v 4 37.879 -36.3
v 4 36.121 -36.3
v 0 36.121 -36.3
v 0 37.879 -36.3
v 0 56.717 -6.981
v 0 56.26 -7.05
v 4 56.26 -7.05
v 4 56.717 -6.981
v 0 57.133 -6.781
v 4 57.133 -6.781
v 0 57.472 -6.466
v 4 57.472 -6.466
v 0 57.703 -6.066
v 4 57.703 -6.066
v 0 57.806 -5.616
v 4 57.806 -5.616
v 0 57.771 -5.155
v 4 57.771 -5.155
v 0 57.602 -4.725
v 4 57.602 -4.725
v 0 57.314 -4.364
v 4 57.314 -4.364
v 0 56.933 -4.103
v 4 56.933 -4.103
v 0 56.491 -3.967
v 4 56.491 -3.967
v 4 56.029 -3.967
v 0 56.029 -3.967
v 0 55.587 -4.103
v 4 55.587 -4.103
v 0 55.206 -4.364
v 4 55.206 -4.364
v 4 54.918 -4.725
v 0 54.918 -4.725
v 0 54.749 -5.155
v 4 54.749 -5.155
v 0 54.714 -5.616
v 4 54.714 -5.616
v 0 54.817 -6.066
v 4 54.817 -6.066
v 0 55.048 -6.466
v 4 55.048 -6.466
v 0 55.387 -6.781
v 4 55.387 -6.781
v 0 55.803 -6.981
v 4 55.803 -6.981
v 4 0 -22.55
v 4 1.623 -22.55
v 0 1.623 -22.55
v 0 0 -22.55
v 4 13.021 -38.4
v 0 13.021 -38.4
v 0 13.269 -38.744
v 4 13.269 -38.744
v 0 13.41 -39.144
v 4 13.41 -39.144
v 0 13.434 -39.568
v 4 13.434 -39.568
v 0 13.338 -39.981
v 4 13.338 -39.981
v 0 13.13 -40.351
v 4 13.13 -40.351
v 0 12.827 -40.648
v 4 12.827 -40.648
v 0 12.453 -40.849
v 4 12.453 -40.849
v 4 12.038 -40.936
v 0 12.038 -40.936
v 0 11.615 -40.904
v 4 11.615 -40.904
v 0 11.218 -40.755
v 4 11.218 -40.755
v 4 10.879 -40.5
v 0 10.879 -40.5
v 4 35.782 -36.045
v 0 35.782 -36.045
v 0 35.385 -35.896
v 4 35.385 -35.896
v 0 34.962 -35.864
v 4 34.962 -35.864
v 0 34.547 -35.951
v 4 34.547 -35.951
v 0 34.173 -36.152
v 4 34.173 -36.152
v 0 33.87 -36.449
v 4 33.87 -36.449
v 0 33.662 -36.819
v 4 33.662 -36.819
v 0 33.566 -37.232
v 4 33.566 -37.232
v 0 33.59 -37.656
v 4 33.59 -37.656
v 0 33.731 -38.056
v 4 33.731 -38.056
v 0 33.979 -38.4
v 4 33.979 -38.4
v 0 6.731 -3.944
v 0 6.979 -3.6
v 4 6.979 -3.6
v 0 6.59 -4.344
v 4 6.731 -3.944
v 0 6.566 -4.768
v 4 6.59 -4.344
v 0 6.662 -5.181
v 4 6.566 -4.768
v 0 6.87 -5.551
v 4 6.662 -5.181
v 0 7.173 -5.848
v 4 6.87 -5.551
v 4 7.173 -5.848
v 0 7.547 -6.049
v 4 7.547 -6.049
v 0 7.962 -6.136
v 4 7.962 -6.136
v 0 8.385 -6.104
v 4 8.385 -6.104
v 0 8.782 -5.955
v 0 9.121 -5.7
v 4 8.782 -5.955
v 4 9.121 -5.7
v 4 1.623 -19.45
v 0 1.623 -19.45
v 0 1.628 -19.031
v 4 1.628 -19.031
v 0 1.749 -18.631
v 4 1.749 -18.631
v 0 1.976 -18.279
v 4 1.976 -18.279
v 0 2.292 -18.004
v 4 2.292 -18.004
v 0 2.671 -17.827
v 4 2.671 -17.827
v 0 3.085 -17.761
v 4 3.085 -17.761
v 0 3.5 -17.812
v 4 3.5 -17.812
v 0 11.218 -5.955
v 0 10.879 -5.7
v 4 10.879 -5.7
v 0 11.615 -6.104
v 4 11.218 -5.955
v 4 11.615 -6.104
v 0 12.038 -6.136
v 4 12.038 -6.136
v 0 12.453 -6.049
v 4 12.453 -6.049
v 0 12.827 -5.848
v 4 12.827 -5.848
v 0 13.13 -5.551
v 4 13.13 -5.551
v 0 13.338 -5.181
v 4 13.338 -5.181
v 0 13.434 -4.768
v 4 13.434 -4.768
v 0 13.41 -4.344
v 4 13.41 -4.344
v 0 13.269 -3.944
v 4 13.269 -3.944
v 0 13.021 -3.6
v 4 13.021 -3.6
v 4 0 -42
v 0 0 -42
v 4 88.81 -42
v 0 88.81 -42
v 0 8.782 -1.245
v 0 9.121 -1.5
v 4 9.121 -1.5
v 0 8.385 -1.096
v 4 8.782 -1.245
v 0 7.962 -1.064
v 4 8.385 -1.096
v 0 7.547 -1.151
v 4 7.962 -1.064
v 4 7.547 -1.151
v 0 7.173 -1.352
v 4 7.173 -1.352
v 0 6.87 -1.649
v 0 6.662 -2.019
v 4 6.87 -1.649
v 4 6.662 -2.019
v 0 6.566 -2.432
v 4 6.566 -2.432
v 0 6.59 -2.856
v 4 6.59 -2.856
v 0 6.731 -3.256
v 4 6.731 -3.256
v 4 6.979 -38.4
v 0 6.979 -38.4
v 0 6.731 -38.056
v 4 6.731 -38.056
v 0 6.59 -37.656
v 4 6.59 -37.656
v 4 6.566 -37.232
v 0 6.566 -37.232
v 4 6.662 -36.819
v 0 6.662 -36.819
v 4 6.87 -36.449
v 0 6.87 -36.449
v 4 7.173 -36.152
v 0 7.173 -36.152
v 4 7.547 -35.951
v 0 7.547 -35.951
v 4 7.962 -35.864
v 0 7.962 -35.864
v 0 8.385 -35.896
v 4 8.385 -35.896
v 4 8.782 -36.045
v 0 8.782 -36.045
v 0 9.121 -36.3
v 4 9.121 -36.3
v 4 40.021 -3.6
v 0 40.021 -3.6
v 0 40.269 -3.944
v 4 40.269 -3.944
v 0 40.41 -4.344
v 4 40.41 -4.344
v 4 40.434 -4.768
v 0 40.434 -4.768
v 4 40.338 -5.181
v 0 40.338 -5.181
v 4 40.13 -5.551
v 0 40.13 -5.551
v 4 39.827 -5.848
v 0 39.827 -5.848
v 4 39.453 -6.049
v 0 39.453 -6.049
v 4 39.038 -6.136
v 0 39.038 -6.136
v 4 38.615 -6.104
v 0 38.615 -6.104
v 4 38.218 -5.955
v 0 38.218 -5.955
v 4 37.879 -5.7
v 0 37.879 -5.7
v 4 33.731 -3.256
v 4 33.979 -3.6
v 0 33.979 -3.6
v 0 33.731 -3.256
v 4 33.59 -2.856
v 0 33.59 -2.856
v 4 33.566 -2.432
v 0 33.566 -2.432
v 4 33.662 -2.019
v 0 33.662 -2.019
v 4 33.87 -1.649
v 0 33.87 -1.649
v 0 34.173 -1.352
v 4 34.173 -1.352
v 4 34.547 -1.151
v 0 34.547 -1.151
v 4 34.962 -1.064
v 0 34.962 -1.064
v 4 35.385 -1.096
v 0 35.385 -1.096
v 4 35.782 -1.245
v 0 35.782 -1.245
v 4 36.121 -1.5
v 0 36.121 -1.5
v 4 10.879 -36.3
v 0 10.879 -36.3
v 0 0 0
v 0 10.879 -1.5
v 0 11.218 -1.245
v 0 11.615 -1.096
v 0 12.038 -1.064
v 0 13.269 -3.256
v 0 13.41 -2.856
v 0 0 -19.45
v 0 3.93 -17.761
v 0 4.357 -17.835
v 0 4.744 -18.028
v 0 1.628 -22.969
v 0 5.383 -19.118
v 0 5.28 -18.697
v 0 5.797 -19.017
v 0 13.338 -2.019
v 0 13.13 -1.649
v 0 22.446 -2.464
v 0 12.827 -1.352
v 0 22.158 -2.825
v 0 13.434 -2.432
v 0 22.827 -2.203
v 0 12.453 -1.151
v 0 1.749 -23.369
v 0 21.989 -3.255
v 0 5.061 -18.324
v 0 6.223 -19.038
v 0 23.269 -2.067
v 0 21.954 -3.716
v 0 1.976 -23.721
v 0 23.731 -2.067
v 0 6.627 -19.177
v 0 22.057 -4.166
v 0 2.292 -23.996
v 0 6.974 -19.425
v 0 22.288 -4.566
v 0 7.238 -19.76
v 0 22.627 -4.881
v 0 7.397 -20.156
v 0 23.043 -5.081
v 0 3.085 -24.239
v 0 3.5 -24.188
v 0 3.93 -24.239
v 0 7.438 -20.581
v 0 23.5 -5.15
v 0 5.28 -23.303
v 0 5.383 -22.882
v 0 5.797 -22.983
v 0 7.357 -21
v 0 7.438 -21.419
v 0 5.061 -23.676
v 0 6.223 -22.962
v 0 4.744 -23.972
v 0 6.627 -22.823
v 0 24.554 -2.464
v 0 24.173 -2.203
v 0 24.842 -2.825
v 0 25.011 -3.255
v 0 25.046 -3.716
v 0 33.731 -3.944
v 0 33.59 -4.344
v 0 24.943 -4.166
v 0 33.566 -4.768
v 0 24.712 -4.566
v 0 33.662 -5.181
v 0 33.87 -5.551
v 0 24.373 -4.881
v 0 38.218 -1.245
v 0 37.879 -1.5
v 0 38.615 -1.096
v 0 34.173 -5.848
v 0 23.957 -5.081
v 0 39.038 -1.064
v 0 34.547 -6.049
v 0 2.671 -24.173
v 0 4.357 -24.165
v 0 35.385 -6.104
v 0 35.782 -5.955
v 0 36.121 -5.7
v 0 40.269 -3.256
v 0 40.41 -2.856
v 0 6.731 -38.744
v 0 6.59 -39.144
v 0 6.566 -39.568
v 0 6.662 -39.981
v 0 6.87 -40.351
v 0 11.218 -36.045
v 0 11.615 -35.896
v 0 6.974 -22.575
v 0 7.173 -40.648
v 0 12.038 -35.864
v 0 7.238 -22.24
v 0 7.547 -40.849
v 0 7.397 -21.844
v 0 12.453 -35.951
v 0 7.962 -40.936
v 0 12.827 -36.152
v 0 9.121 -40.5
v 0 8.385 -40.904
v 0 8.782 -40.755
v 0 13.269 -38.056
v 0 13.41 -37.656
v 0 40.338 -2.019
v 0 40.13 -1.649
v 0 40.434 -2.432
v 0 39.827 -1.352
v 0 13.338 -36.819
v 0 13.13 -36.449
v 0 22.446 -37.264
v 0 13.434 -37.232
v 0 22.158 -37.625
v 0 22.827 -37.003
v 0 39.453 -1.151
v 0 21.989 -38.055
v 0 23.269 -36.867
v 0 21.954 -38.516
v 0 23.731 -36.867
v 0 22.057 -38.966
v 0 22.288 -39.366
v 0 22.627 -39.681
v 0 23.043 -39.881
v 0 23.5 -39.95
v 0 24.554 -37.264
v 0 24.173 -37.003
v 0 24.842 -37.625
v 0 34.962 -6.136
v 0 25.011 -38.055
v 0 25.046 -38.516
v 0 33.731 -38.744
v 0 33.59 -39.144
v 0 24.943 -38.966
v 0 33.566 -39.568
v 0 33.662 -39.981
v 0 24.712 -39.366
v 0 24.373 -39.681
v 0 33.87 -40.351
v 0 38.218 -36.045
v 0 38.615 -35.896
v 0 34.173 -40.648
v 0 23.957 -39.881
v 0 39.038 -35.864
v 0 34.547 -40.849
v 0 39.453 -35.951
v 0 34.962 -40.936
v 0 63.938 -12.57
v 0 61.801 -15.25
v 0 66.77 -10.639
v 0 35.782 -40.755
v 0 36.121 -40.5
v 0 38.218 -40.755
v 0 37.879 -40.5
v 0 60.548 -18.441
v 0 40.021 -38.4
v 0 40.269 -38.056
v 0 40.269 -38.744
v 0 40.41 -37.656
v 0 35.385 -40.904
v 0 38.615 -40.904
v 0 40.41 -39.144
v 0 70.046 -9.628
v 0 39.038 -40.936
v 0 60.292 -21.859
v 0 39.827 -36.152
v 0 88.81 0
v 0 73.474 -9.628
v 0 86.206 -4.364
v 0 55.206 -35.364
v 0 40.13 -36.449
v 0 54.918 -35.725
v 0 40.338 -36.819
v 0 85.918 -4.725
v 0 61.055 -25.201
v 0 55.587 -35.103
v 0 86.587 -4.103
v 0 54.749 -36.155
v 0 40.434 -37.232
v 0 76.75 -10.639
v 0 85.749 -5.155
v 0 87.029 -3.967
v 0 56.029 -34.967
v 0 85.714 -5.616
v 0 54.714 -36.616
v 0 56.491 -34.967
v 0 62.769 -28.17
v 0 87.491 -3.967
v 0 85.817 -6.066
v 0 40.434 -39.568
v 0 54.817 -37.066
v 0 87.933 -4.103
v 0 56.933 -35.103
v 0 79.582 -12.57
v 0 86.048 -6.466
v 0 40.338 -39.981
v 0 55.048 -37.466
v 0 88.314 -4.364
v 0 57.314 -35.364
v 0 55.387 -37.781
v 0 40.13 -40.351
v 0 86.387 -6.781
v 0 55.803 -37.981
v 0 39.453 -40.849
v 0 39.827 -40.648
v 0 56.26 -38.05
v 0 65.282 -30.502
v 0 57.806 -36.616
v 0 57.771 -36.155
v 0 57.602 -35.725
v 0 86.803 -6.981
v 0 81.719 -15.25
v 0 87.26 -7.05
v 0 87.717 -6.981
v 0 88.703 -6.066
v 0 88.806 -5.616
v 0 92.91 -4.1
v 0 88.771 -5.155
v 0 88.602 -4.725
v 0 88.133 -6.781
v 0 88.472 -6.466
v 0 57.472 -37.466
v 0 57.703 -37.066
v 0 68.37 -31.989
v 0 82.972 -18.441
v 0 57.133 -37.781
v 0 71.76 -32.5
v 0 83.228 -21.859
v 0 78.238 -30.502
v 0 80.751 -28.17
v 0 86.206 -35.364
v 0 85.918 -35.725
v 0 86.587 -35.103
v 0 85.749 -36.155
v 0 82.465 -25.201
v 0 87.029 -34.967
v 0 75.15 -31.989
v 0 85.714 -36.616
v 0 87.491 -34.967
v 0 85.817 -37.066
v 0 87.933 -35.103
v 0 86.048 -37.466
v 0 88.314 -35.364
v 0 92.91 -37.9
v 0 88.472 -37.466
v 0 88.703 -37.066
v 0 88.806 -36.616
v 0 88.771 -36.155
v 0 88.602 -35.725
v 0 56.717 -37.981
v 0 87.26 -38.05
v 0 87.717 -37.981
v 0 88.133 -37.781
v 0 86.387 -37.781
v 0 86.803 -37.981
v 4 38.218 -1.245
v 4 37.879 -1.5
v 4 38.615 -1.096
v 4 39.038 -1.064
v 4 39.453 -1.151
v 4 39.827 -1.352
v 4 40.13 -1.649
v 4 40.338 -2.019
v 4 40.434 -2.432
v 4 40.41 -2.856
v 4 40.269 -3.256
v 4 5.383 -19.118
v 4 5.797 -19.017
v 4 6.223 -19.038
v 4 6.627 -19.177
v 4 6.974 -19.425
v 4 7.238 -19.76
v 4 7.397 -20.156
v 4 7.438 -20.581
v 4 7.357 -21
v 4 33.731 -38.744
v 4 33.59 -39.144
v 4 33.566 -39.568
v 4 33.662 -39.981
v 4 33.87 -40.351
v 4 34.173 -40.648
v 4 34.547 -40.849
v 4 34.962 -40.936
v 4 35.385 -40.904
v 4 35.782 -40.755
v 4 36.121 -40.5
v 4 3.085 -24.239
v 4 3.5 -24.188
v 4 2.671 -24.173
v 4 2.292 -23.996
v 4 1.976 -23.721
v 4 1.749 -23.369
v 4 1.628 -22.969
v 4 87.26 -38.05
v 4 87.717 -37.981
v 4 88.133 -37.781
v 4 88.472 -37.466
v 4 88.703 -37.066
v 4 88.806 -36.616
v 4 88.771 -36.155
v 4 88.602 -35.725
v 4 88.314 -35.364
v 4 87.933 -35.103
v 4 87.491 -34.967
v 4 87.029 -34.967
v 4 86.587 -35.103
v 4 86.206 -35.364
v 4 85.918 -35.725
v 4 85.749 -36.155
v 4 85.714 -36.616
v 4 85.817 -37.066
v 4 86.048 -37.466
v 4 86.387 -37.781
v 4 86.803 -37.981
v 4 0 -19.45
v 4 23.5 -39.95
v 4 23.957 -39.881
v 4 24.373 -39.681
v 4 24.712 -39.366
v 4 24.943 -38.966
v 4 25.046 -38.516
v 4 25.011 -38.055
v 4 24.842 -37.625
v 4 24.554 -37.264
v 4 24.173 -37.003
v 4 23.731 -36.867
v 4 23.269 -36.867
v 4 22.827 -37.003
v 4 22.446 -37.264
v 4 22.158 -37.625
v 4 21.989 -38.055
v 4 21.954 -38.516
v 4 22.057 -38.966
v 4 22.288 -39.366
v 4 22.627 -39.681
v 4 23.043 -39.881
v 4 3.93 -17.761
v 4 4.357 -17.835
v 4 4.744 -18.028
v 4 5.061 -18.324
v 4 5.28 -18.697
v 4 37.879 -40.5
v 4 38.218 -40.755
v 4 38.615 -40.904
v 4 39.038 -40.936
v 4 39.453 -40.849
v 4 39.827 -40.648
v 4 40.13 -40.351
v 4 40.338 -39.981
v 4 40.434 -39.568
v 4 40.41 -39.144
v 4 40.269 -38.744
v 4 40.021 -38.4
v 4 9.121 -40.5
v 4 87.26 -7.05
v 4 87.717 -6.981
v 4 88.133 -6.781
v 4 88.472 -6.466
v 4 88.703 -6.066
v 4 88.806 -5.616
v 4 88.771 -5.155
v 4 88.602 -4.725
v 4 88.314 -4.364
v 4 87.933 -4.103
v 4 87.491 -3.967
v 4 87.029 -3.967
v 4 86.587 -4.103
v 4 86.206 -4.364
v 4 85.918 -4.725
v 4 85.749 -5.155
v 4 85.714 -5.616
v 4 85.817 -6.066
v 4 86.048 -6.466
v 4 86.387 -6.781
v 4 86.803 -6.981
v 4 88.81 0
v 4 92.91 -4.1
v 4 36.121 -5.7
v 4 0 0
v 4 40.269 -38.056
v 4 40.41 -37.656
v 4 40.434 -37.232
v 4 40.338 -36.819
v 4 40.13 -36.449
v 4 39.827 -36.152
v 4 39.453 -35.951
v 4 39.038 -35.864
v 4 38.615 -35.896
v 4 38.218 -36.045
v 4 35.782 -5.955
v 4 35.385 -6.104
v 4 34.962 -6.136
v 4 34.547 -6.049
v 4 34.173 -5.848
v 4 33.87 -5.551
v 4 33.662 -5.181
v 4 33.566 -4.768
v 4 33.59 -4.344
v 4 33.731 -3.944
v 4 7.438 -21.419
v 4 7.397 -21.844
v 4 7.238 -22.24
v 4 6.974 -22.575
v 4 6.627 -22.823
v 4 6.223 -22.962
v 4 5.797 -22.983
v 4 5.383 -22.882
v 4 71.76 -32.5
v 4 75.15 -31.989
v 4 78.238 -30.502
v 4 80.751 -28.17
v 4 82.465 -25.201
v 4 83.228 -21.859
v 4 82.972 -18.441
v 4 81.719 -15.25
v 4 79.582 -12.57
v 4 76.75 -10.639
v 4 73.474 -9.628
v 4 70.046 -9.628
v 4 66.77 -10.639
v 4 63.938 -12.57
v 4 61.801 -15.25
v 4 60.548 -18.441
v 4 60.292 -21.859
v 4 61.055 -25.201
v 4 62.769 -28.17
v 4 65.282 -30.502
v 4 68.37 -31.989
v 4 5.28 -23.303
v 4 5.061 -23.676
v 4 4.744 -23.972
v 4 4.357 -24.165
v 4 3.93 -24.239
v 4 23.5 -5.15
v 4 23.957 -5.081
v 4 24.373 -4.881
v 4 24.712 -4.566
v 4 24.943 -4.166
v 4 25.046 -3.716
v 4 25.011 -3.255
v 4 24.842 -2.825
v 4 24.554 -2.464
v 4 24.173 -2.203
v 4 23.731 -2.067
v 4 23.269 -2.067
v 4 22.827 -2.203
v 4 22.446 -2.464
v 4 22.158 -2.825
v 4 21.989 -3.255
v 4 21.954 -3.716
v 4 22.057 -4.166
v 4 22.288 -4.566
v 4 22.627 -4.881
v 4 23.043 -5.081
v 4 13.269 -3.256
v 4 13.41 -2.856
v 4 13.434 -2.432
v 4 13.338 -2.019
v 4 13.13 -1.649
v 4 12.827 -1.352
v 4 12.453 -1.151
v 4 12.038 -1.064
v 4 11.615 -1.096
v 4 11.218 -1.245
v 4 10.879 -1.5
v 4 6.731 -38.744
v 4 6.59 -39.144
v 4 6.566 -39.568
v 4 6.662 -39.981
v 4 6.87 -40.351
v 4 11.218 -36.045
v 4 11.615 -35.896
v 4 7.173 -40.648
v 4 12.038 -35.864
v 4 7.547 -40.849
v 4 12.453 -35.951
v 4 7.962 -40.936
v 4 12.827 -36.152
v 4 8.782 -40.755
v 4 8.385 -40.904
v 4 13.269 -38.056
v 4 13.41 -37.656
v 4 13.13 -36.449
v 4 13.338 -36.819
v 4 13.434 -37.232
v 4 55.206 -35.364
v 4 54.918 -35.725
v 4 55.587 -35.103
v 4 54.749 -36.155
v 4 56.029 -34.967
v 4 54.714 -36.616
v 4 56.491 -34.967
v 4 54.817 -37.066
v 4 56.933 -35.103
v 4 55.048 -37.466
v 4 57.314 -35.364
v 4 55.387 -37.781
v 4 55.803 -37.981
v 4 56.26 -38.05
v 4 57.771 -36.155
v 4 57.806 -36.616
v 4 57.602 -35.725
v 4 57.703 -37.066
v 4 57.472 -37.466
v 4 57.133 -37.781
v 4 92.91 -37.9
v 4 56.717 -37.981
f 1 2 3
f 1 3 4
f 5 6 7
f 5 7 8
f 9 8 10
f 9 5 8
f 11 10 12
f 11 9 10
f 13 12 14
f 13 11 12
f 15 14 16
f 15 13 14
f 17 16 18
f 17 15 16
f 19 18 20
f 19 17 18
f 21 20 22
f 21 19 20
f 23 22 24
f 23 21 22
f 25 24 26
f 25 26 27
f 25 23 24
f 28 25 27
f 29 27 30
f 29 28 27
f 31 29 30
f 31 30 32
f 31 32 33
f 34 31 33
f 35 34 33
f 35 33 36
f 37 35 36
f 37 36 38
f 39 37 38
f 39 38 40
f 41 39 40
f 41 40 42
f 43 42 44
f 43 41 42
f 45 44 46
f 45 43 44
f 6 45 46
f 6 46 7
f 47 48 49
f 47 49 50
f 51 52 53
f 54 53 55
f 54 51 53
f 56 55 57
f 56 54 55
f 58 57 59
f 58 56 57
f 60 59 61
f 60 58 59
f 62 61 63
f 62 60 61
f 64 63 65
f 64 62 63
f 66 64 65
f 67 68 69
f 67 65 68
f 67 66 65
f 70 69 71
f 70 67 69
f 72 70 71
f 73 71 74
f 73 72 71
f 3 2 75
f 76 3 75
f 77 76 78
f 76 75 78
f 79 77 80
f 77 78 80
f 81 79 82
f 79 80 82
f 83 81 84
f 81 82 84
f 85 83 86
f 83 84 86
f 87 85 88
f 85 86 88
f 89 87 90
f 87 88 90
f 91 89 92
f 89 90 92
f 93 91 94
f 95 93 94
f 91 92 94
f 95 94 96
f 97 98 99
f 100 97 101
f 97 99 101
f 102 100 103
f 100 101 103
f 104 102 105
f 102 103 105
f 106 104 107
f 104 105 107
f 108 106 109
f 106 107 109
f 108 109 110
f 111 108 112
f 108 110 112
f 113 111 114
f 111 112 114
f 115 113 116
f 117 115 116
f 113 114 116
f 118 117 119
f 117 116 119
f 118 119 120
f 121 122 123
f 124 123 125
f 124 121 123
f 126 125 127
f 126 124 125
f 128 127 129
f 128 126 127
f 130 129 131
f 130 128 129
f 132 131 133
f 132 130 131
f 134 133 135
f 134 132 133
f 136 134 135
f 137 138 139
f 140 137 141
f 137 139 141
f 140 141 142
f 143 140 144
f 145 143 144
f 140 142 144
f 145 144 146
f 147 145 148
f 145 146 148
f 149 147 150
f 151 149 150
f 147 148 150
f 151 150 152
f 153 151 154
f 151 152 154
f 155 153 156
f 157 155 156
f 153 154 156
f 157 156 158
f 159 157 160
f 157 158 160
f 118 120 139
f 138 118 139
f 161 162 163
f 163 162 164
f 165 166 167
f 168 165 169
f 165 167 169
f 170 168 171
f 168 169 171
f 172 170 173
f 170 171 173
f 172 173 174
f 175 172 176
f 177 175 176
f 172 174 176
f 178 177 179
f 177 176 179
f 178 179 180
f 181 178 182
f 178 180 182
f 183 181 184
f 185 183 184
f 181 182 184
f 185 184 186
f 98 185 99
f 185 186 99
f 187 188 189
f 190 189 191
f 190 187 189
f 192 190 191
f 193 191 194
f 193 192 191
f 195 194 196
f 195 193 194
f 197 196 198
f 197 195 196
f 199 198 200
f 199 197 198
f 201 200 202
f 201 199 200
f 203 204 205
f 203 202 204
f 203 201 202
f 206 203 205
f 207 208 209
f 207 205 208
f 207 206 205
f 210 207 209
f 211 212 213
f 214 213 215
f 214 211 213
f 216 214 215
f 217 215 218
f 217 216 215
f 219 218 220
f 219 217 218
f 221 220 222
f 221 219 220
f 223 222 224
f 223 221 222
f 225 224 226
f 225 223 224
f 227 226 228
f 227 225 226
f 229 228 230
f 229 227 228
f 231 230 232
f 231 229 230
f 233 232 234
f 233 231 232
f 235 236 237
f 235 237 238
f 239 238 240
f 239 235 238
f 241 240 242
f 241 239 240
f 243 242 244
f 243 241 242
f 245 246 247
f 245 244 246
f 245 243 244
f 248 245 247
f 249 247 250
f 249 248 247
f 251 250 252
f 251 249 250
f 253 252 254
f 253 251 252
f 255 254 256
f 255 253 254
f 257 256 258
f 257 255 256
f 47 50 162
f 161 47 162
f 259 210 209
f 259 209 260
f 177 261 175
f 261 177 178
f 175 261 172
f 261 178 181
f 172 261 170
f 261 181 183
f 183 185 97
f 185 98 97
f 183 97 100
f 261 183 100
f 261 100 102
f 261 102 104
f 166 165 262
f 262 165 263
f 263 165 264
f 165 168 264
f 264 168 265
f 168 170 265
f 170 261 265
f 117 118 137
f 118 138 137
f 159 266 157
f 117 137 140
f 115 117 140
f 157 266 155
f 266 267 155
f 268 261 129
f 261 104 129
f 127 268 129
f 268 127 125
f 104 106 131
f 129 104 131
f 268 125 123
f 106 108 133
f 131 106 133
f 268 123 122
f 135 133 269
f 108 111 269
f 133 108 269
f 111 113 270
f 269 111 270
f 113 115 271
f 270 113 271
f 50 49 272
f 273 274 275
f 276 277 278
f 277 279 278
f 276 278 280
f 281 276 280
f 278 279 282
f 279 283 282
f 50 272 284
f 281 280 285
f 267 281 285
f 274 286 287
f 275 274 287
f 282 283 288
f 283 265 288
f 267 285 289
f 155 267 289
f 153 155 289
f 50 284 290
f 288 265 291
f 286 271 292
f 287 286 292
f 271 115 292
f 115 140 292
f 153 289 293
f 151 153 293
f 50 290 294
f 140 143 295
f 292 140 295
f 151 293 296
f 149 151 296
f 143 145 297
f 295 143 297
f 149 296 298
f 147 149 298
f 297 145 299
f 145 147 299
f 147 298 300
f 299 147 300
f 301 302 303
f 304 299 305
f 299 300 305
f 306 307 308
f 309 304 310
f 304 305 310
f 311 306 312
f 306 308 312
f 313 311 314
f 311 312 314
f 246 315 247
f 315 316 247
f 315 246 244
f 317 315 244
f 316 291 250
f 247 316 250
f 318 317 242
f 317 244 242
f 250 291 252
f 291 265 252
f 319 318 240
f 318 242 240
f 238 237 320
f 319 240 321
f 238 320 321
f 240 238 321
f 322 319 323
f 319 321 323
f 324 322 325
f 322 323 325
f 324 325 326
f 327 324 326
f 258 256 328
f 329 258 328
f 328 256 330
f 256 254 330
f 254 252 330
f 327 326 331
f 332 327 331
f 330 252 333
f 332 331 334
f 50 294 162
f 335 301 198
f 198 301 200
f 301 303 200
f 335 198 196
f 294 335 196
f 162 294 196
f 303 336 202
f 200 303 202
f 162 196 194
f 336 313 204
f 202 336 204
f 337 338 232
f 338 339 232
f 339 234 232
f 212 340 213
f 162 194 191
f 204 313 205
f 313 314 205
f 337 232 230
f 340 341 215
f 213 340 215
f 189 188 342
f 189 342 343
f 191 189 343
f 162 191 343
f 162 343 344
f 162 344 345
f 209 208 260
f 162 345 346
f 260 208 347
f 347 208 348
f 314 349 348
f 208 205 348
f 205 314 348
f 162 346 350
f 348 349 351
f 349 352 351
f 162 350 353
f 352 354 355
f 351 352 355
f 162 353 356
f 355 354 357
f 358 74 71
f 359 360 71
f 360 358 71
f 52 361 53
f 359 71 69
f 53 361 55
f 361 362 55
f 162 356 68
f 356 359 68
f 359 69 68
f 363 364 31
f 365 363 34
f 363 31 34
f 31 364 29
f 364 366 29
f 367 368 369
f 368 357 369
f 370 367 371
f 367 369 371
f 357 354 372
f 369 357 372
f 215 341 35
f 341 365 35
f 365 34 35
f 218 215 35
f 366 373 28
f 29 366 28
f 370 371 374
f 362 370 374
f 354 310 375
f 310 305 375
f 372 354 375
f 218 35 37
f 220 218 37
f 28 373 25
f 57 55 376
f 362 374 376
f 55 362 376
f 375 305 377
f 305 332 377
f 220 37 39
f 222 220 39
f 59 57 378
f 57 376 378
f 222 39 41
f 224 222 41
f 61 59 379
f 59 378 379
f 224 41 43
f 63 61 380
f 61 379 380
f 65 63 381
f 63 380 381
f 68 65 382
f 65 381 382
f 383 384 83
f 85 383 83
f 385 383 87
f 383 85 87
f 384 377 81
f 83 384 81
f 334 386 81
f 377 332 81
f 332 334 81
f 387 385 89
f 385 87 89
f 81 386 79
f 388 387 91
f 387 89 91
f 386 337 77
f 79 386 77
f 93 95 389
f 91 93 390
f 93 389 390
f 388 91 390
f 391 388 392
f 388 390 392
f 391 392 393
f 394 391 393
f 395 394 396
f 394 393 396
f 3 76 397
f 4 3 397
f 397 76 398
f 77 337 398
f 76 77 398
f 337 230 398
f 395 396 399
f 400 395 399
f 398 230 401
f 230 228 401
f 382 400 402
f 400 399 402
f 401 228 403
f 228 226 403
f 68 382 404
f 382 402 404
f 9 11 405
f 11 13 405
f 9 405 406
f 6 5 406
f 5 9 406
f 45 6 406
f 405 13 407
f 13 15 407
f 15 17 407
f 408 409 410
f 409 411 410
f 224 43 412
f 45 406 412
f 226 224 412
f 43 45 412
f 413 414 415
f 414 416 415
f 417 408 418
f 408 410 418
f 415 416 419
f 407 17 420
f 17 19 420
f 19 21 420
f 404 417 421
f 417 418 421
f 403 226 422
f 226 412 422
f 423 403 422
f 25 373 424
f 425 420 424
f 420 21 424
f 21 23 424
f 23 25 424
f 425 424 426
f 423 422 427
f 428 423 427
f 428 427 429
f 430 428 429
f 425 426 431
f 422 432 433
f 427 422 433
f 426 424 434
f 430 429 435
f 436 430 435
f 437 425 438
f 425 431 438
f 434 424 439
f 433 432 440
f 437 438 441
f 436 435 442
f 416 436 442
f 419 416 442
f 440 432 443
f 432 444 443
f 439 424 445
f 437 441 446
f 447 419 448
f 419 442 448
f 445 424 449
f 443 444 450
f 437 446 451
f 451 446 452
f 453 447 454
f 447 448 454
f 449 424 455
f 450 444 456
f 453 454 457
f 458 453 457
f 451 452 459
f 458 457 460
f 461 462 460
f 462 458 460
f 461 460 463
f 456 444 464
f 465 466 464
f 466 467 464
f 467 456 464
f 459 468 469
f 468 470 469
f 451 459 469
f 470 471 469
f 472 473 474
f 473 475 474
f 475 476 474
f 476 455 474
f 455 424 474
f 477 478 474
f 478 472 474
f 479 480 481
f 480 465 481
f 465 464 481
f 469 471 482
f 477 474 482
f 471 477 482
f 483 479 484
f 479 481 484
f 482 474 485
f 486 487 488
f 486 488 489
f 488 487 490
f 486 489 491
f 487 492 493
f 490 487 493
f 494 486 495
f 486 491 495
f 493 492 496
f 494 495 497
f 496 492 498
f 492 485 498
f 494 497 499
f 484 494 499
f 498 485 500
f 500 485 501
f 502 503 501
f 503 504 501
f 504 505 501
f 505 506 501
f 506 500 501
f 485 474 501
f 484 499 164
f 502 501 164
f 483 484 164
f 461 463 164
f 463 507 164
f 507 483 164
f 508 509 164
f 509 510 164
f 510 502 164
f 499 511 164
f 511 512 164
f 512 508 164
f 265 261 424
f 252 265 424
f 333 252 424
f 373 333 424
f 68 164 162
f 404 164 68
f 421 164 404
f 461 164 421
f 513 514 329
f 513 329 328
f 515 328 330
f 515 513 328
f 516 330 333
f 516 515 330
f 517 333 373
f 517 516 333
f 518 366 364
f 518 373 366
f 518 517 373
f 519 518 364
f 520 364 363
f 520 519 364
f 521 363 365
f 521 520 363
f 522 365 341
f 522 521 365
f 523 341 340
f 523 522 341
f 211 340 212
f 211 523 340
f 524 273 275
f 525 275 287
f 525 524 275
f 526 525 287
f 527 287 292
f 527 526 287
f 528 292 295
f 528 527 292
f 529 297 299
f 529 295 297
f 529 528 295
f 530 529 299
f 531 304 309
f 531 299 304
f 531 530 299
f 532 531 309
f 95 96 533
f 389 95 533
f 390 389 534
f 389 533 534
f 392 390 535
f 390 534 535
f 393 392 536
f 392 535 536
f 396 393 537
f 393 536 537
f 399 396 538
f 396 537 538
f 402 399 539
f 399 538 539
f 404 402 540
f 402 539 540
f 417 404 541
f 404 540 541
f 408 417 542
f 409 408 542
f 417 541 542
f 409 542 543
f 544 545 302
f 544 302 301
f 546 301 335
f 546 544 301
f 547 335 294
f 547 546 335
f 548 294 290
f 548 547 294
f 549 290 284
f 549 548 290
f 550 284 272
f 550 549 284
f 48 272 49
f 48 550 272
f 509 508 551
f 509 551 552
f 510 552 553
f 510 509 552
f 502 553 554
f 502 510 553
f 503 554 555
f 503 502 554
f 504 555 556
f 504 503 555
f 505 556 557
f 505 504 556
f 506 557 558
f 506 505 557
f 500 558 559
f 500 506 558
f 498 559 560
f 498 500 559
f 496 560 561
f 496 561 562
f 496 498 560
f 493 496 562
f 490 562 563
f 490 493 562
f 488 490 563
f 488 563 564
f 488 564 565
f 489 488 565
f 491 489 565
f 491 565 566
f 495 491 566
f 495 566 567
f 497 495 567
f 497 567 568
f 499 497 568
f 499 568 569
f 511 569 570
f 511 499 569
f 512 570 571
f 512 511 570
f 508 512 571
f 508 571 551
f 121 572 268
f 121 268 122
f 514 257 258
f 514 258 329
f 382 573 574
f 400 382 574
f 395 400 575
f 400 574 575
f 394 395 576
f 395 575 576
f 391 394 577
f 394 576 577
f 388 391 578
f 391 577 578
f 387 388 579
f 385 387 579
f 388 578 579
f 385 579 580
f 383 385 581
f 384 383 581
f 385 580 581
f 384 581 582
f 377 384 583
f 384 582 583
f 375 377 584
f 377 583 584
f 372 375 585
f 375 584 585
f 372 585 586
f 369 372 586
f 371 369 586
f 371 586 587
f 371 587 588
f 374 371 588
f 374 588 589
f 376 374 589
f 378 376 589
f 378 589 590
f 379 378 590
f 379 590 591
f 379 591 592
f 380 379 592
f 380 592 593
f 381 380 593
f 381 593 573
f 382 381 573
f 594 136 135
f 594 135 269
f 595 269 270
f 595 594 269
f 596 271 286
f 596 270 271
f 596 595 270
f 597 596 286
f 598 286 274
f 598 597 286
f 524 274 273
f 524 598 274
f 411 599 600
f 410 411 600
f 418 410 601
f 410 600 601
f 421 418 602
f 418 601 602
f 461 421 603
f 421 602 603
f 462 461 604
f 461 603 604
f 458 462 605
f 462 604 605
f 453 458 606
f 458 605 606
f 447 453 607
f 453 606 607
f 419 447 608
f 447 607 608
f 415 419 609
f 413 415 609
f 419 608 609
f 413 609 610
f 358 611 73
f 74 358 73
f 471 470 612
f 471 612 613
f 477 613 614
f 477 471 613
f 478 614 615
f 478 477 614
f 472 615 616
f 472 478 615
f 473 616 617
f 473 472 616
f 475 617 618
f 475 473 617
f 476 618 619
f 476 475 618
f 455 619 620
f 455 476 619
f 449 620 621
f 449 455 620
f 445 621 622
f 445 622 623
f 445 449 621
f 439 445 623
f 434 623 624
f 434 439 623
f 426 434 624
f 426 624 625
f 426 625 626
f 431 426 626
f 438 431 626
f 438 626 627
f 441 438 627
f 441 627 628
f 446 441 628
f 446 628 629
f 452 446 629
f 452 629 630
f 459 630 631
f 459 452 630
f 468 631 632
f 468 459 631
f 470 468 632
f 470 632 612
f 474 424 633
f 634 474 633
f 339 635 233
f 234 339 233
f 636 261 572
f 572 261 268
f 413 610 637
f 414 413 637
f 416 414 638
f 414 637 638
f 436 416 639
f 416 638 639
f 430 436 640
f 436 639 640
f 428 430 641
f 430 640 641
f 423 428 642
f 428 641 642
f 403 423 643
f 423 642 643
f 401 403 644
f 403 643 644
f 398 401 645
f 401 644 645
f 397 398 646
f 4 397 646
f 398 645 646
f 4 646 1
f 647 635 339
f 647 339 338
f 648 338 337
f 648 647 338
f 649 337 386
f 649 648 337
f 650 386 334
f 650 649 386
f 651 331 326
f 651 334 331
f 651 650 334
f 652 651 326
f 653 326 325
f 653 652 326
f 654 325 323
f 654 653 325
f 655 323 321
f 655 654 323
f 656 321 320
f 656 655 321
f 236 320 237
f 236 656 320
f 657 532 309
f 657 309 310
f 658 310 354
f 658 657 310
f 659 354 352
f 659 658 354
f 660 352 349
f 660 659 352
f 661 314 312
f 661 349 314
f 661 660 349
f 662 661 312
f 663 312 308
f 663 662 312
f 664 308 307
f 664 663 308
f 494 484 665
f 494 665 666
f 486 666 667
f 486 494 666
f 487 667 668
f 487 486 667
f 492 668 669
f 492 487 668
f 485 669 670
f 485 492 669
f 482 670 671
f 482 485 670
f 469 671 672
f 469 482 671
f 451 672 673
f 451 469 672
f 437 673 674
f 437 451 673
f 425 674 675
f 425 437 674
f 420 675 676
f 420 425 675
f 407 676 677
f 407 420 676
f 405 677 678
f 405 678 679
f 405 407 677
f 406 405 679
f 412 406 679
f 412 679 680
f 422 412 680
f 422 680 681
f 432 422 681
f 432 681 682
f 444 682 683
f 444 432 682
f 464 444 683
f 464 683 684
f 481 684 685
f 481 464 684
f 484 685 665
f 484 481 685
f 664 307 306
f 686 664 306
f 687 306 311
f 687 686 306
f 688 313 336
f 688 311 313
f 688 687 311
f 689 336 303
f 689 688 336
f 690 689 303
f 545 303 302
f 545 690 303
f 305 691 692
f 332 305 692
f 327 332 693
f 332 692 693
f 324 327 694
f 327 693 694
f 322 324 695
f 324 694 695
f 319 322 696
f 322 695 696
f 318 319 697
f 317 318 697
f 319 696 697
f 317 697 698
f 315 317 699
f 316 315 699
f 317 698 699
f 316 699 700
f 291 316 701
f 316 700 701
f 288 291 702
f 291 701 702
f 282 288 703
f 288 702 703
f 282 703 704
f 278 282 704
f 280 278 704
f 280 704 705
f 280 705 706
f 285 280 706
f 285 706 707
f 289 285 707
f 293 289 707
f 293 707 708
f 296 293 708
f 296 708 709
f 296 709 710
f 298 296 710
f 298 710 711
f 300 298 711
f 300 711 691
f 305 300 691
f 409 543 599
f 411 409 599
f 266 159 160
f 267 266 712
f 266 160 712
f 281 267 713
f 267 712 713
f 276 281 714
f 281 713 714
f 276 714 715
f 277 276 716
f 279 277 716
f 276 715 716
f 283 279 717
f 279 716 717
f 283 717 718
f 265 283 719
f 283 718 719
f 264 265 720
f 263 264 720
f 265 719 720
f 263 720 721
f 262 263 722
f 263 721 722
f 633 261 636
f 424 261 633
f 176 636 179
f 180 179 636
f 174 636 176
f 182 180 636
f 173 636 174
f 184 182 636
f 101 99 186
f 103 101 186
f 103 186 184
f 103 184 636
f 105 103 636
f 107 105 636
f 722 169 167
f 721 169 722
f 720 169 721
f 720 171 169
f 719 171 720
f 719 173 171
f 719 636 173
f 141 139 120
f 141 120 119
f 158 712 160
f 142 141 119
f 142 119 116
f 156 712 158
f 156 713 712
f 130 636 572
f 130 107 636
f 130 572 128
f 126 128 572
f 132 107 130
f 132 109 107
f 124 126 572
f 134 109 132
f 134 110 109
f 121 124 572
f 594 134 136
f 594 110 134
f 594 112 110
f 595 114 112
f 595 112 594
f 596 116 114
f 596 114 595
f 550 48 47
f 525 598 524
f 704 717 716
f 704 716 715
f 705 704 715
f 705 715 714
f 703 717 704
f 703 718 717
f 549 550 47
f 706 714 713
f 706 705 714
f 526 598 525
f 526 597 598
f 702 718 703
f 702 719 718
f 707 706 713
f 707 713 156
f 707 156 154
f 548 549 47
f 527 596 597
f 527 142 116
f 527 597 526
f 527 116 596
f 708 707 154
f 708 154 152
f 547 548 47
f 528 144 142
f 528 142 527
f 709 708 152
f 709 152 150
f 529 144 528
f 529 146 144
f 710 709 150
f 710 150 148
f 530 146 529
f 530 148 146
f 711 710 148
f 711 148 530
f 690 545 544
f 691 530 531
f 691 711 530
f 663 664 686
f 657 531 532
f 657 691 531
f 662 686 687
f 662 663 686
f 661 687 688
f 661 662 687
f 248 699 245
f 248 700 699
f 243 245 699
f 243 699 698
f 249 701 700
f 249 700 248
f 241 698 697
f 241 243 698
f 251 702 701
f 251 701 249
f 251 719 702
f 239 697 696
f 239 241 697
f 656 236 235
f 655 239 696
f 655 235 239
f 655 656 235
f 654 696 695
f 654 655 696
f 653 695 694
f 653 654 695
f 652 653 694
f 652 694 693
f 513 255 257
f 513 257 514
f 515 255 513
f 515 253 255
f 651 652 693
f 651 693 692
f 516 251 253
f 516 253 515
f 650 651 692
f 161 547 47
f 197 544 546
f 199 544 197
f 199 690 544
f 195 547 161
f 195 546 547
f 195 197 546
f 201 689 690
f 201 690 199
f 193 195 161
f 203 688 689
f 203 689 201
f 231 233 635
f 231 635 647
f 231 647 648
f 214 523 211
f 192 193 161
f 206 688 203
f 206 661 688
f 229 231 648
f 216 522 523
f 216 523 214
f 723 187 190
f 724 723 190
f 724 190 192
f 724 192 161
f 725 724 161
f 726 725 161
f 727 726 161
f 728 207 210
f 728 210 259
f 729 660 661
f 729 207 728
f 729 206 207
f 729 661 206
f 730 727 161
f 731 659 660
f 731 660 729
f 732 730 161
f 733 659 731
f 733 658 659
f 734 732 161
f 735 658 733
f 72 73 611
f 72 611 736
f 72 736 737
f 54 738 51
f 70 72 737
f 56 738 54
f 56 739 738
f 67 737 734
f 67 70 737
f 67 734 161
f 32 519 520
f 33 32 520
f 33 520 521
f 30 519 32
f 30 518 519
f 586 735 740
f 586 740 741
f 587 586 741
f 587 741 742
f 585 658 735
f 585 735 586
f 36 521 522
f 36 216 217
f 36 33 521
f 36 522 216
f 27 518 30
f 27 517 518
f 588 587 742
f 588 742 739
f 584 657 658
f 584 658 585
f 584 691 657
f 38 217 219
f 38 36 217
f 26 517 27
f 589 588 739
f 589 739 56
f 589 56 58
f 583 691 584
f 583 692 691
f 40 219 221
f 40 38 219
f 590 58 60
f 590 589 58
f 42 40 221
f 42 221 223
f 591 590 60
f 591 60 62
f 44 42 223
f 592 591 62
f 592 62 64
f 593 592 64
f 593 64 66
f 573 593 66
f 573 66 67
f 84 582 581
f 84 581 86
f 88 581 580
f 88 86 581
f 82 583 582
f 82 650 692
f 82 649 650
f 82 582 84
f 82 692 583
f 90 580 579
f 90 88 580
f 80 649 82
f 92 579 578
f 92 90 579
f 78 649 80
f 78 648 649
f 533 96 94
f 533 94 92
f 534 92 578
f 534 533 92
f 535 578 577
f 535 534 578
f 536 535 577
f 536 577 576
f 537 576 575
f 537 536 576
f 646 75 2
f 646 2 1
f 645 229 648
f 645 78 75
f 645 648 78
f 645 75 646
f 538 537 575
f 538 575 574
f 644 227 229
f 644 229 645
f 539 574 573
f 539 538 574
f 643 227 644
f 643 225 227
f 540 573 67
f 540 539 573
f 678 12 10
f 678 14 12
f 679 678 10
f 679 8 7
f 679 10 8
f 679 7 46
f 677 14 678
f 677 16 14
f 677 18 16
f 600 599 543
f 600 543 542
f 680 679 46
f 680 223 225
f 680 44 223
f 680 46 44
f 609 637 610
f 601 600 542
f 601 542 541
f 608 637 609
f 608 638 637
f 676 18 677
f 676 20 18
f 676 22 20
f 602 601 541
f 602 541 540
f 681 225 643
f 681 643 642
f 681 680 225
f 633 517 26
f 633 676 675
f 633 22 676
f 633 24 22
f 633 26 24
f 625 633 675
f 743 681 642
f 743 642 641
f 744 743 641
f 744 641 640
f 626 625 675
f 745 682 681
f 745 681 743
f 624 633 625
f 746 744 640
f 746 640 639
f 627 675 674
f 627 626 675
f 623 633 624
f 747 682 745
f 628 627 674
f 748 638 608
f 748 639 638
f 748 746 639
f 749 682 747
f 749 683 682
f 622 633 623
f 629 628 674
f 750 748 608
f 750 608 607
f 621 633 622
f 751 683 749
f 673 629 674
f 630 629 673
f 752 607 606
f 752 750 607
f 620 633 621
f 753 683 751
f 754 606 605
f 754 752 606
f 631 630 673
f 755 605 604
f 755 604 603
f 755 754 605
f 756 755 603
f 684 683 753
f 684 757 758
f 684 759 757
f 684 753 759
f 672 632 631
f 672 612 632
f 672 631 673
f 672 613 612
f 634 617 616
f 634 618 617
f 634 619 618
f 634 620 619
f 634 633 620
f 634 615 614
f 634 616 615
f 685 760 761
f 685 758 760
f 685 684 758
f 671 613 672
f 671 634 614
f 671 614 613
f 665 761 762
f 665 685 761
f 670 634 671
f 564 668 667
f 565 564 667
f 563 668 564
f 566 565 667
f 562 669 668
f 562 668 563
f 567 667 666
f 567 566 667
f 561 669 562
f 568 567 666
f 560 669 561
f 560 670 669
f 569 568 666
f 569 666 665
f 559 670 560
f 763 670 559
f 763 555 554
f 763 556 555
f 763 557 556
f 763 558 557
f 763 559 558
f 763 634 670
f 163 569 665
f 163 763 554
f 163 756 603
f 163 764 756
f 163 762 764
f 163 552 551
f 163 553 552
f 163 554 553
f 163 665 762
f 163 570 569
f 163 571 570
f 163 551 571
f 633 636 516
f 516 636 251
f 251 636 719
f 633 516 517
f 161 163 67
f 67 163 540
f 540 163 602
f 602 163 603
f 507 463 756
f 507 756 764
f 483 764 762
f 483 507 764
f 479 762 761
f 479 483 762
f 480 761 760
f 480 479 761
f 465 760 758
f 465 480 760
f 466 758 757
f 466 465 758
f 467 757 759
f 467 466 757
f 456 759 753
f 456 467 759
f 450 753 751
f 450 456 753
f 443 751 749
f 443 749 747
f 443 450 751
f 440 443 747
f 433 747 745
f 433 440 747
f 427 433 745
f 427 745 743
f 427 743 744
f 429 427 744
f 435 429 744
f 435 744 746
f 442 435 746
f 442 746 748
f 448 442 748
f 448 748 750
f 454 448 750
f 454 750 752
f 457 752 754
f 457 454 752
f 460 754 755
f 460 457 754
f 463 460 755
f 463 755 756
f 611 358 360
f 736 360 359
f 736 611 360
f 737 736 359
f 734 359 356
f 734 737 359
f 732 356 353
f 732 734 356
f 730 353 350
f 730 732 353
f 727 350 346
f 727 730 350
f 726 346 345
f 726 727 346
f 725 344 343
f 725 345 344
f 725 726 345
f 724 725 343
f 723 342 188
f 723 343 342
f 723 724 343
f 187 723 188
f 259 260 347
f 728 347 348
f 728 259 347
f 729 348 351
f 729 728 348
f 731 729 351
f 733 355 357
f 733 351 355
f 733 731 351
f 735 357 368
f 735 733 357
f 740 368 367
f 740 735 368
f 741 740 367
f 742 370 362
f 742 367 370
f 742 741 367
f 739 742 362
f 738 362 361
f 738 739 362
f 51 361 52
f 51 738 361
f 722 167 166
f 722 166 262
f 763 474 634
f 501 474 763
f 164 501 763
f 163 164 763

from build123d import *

# Parameters (mm, degrees)
CROQUIS1_W              = 42
CROQUIS1_H              = 92.91
CROQUIS1_R              = 11.5
CROQUIS1_R_2            = 1.55
SALIENTE_EXTRUIR1_DEPTH = 4
CROQUIS2_R              = 1.55
CROQUIS2_W              = 4.2
CROQUIS2_H              = 6
CORTAR_EXTRUIR1_DEPTH   = 5
CORTAR_EXTRUIR2_DEPTH   = 5
CORTAR_EXTRUIR3_DEPTH   = 5
CORTAR_EXTRUIR4_DEPTH   = 5
CHAFL_N1_SIZE           = 4.1


with BuildPart() as part:
    # Croquis1 → Saliente-Extruir1 (new body)
    with BuildSketch(Plane(origin=(0, 0, 0), x_dir=(0, 0, -1), z_dir=(1, 0, 0))):
        with Locations((21, 46.455)):
            Rectangle(CROQUIS1_W, CROQUIS1_H)
        with Locations((21, 71.76)):
            Circle(CROQUIS1_R, mode=Mode.SUBTRACT)
        with Locations((5.5, 87.26)):
            Circle(CROQUIS1_R_2, mode=Mode.SUBTRACT)
        with Locations((36.5, 87.26)):
            Circle(CROQUIS1_R_2, mode=Mode.SUBTRACT)
        with Locations((36.5, 56.26)):
            Circle(CROQUIS1_R_2, mode=Mode.SUBTRACT)
        with Locations((5.5, 56.26)):
            Circle(CROQUIS1_R_2, mode=Mode.SUBTRACT)
    extrude(amount=SALIENTE_EXTRUIR1_DEPTH)

    # Croquis2 → Cortar-Extruir1 (cut, through all)
    with BuildSketch(Plane(origin=(4, 0, 0), x_dir=(0, 0, -1), z_dir=(1, 0, 0))):
        with Locations((3.6, 23.5)):
            Circle(CROQUIS2_R)
        with Locations((38.4, 23.5)):
            Circle(CROQUIS2_R)
        with Locations((3.6, 37)):
            Rectangle(CROQUIS2_W, CROQUIS2_H)
        with Locations((3.6, 10)):
            Rectangle(CROQUIS2_W, CROQUIS2_H)
        with Locations((38.4, 10)):
            Rectangle(CROQUIS2_W, CROQUIS2_H)
        with Locations((38.4, 37)):
            Rectangle(CROQUIS2_W, CROQUIS2_H)
    extrude(amount=-CORTAR_EXTRUIR1_DEPTH, mode=Mode.SUBTRACT)

    # Croquis3 → Cortar-Extruir2 (cut, through all)
    with BuildSketch(Plane(origin=(4, 0, 0), x_dir=(0, 0, -1), z_dir=(1, 0, 0))):
        Polygon((19.45, 0), (19.45, 2.05), (18.2, 2.05), (18.2, 4.95), (19.45, 4.95), (19.45, 7), (22.55, 7), (22.55, 4.95), (23.8, 4.95), (23.8, 2.05), (22.55, 2.05), (22.55, 0), align=None)
    extrude(amount=-CORTAR_EXTRUIR2_DEPTH, mode=Mode.SUBTRACT)

    # Croquis4 → Cortar-Extruir3 (cut, through all)
    with BuildSketch(Plane(origin=(4, 0, 0), x_dir=(0, 0, -1), z_dir=(1, 0, 0))):
        with BuildLine():
            Line((5.7, 37.878679656), (5.7, 36.121320344))
            ThreePointArc((5.7, 36.121320344), (5.710503119, 34.010608171), (3.6, 33.979099854))
            ThreePointArc((3.6, 33.979099854), (1.489496881, 34.010608171), (1.5, 36.121320344))
            Line((1.5, 36.121320344), (1.5, 37.878679656))
            ThreePointArc((1.5, 37.878679656), (1.489496881, 39.989391829), (3.6, 40.020900146))
            ThreePointArc((3.6, 40.020900146), (5.710503119, 39.989391829), (5.7, 37.878679656))
        make_face()
        with BuildLine():
            Line((40.5, 36.121320344), (40.5, 37.878679656))
            ThreePointArc((40.5, 37.878679656), (40.510503119, 39.989391829), (38.4, 40.020900146))
            ThreePointArc((38.4, 40.020900146), (36.289496881, 39.989391829), (36.3, 37.878679656))
            Line((36.3, 37.878679656), (36.3, 36.121320344))
            ThreePointArc((36.3, 36.121320344), (36.289496881, 34.010608171), (38.4, 33.979099854))
            ThreePointArc((38.4, 33.979099854), (40.510503119, 34.010608171), (40.5, 36.121320344))
        make_face()
        with BuildLine():
            Line((36.3, 9.121320344), (36.3, 10.878679656))
            ThreePointArc((36.3, 10.878679656), (36.289496881, 12.989391829), (38.4, 13.020900146))
            ThreePointArc((38.4, 13.020900146), (40.510503119, 12.989391829), (40.5, 10.878679656))
            Line((40.5, 10.878679656), (40.5, 9.121320344))
            ThreePointArc((40.5, 9.121320344), (40.510503119, 7.010608171), (38.4, 6.979099854))
            ThreePointArc((38.4, 6.979099854), (36.289496881, 7.010608171), (36.3, 9.121320344))
        make_face()
        with BuildLine():
            Line((5.7, 9.121320344), (5.7, 10.878679656))
            ThreePointArc((5.7, 10.878679656), (5.710503119, 12.989391829), (3.6, 13.020900146))
            ThreePointArc((3.6, 13.020900146), (1.489496881, 12.989391829), (1.5, 10.878679656))
            Line((1.5, 10.878679656), (1.5, 9.121320344))
            ThreePointArc((1.5, 9.121320344), (1.489496881, 7.010608171), (3.6, 6.979099854))
            ThreePointArc((3.6, 6.979099854), (5.710503119, 7.010608171), (5.7, 9.121320344))
        make_face()
    extrude(amount=-CORTAR_EXTRUIR3_DEPTH, mode=Mode.SUBTRACT)

    # Croquis5 → Cortar-Extruir4 (cut, through all)
    with BuildSketch(Plane(origin=(4, 0, 0), x_dir=(0, 0, -1), z_dir=(1, 0, 0))):
        with BuildLine():
            Line((21.678679656, 2.05), (20.321320344, 2.05))
            ThreePointArc((20.321320344, 2.05), (18.510162011, 1.811909807), (17.812069651, 3.5))
            ThreePointArc((17.812069651, 3.5), (18.028132476, 4.744252385), (19.117836757, 5.382524838))
            ThreePointArc((19.117836757, 5.382524838), (19.424850602, 6.97423962), (21, 7.35727725))
            ThreePointArc((21, 7.35727725), (22.575149398, 6.97423962), (22.882163243, 5.382524838))
            ThreePointArc((22.882163243, 5.382524838), (23.971867524, 4.744252385), (24.187930349, 3.5))
            ThreePointArc((24.187930349, 3.5), (23.489837989, 1.811909807), (21.678679656, 2.05))
        make_face()
    extrude(amount=-CORTAR_EXTRUIR4_DEPTH, mode=Mode.SUBTRACT)

    # Chaflán1
    chafl_n1_edges = [part.edges().sort_by_distance(p)[0] for p in [
        (2, 92.91, 0),
        (2, 92.91, -42),
    ]]
    chamfer(chafl_n1_edges, length=CHAFL_N1_SIZE)


solid = part.part
